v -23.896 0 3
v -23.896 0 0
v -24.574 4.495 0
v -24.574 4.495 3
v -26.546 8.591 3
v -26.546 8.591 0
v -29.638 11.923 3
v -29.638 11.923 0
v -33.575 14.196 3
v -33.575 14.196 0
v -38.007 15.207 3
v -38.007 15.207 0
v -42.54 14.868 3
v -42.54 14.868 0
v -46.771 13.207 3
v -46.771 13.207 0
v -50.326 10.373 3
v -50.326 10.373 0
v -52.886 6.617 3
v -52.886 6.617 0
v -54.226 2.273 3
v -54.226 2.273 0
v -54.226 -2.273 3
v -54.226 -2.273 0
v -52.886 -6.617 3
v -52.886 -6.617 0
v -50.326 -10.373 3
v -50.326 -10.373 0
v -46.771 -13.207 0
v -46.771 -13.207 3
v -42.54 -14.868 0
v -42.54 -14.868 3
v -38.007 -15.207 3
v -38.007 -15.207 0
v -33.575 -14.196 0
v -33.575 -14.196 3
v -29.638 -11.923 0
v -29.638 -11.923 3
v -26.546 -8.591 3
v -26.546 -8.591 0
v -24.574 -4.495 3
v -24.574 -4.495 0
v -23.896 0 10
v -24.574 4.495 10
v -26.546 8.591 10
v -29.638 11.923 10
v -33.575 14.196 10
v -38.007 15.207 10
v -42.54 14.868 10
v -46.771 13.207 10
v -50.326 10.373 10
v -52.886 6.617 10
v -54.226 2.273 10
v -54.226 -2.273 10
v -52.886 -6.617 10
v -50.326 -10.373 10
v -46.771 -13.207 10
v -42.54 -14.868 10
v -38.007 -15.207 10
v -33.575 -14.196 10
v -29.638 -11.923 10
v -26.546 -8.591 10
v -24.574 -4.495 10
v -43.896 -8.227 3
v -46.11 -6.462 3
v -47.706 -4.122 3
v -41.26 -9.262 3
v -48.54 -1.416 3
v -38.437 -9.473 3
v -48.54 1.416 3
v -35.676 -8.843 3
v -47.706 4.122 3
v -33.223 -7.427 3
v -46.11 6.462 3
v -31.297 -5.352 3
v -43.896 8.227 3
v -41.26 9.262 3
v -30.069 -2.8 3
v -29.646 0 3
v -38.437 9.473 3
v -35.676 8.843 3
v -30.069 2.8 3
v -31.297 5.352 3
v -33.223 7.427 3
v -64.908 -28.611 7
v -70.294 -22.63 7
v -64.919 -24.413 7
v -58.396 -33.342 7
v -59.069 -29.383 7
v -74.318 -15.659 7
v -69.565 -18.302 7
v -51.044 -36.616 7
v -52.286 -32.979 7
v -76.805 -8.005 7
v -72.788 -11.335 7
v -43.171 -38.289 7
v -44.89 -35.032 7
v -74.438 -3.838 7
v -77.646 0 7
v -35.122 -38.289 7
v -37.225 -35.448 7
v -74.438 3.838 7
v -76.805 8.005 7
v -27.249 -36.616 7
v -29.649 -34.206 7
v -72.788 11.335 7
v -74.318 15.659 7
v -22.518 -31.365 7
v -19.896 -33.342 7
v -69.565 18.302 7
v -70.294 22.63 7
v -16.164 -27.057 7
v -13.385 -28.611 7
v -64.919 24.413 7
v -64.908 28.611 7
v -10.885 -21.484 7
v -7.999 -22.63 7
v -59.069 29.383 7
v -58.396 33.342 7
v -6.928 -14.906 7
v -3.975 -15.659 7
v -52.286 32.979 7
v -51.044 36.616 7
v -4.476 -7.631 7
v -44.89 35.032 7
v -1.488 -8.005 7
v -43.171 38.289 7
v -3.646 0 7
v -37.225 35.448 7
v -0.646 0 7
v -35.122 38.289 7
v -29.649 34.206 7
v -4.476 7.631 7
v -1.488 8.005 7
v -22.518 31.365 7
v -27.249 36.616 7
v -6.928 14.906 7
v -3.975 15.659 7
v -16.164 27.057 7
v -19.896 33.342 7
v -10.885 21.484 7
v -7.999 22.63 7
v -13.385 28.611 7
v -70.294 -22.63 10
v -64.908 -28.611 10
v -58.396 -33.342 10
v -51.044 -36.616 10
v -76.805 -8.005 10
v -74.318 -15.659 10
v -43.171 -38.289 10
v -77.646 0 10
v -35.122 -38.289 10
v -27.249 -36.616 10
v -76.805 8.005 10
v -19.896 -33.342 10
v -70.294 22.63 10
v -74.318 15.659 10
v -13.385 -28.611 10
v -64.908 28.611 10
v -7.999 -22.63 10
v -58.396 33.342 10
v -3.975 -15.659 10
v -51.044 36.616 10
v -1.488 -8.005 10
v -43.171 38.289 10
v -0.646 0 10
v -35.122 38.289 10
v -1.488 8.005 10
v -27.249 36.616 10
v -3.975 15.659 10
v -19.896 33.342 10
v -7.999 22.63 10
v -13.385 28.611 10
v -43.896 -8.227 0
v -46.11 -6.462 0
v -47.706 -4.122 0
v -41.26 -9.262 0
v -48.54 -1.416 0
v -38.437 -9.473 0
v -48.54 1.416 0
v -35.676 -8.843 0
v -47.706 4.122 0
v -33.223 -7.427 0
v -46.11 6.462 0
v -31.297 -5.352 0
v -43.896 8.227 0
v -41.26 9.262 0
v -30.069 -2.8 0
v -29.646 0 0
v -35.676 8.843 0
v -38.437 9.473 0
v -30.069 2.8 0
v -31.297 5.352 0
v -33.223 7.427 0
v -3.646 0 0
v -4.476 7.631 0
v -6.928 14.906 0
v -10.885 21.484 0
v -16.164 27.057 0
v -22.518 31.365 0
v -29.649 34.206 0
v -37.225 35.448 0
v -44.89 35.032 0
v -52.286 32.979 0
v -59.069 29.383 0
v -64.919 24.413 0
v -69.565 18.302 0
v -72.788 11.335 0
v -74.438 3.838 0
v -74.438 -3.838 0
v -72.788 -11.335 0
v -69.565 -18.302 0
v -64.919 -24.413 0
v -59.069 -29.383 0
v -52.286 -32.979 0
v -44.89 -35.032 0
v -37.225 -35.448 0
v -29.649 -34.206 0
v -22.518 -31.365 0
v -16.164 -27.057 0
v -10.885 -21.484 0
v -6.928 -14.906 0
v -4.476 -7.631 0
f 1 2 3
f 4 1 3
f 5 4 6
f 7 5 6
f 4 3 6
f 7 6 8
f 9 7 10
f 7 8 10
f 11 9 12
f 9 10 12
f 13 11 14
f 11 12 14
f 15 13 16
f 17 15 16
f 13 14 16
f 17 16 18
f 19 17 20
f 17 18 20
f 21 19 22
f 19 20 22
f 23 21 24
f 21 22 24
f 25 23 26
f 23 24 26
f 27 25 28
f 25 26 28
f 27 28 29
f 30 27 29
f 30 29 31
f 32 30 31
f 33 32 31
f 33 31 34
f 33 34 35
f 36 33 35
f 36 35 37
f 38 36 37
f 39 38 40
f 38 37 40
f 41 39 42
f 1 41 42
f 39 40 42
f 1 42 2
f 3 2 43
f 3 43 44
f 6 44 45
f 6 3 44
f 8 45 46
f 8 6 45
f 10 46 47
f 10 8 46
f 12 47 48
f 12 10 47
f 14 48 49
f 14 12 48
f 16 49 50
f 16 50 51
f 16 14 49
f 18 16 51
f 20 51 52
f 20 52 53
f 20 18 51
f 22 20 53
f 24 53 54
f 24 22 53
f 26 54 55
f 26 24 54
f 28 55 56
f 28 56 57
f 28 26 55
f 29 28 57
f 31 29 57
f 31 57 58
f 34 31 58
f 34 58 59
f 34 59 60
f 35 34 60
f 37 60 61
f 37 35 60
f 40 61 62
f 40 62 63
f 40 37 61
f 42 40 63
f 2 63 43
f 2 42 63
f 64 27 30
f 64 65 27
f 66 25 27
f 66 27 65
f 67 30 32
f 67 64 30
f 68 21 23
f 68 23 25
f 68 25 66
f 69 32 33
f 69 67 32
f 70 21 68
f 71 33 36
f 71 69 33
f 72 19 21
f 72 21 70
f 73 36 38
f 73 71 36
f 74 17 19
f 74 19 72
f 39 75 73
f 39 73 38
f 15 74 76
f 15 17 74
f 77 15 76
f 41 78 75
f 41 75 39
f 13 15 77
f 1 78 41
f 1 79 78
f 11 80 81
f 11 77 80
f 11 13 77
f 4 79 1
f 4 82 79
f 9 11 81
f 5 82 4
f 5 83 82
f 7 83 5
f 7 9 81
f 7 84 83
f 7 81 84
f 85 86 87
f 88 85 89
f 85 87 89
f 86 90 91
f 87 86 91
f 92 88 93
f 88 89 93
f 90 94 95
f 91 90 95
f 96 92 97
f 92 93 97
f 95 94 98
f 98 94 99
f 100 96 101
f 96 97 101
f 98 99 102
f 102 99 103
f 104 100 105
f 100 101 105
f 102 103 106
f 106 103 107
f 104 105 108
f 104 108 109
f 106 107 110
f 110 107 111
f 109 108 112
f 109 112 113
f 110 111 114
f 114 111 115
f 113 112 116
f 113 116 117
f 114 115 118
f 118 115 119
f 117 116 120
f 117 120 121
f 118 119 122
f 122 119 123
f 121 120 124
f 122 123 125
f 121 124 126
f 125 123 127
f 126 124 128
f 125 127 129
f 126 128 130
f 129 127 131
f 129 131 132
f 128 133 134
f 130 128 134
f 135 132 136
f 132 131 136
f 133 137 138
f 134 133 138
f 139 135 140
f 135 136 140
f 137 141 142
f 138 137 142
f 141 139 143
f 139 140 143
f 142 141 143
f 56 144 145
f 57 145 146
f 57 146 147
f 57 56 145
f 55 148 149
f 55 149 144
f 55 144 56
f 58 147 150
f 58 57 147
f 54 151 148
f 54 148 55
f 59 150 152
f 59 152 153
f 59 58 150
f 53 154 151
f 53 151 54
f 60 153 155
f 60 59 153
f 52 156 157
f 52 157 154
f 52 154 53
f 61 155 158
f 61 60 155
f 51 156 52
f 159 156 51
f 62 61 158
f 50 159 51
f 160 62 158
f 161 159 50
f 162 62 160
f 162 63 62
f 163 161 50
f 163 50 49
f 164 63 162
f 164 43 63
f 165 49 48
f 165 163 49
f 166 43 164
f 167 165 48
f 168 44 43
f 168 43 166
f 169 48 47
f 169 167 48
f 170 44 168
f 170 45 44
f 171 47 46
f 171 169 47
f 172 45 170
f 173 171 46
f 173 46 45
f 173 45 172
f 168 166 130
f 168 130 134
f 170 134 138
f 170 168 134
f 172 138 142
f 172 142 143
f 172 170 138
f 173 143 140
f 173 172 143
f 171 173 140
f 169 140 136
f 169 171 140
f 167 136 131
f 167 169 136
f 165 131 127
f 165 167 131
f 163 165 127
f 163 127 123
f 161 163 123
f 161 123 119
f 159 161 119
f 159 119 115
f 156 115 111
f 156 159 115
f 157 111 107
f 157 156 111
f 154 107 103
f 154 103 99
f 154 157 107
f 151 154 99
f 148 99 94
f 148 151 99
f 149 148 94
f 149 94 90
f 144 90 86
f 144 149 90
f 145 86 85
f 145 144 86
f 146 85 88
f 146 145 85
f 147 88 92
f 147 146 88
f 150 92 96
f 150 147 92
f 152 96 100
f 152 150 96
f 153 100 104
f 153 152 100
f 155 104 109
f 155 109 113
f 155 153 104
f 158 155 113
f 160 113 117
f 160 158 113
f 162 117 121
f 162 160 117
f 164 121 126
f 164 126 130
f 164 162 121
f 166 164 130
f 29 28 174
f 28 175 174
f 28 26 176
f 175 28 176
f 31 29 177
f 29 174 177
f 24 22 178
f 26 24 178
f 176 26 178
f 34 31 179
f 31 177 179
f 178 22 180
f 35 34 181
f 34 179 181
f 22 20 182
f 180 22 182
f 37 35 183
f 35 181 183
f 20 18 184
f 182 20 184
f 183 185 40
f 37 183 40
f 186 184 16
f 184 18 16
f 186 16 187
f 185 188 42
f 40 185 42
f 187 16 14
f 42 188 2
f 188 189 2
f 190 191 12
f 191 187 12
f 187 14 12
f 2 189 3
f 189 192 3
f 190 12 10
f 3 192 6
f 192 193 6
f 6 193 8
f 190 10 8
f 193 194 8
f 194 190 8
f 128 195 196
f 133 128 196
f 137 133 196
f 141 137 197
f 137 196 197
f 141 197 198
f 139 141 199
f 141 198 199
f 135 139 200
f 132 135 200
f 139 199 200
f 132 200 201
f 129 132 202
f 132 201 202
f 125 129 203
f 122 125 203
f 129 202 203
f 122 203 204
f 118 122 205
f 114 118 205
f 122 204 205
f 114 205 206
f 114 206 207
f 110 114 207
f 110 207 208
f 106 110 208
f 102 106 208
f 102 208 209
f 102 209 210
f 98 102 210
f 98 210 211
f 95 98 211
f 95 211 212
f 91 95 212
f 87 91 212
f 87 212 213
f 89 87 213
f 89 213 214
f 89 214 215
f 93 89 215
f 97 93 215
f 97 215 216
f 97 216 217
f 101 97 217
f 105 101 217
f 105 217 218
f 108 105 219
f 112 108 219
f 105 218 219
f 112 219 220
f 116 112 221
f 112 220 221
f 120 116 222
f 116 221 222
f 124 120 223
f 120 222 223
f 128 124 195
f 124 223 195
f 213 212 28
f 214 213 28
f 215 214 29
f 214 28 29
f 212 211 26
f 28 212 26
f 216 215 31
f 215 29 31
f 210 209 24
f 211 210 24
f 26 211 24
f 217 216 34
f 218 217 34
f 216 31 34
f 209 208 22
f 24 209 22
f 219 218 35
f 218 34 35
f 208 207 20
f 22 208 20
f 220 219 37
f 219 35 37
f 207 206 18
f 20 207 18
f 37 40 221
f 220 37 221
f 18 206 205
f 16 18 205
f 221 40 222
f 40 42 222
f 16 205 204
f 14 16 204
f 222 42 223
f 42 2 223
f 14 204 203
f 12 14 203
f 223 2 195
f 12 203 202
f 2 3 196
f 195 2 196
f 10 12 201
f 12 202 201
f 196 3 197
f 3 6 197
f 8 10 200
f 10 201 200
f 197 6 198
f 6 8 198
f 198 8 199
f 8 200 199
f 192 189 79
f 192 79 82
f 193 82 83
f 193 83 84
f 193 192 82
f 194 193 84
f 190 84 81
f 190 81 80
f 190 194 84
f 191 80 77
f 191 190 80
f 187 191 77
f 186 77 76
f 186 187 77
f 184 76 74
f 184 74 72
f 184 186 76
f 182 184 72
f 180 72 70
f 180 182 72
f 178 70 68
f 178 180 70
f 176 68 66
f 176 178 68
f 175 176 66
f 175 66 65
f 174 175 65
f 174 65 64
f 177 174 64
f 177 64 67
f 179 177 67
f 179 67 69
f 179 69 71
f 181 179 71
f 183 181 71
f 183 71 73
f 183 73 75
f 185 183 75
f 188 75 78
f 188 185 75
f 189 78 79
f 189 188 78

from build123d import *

# Parameters (mm, degrees)
F0_R     = 15.25
F0_R_2   = 9.5
F1_DEPTH = 3
F0_R_3   = 35.5
F2_DEPTH = 10
F3_R     = 38.5
F3_R_2   = 35.5
F4_DEPTH = 3


# Not quite as in the source:
# - a feature names something its author has since deleted; it is built from what else it names


with BuildPart() as f1:
    # F0 (on Top) → F1 (new body)
    with BuildSketch(Plane.XY):
        with Locations((-39.1464792192, 0)):
            Circle(F0_R)
        with Locations((-39.1464792192, 0)):
            Circle(F0_R_2, mode=Mode.SUBTRACT)
    extrude(amount=F1_DEPTH)


with BuildPart() as f2:
    # F0 (on Top) → F2 (new body)
    with BuildSketch(Plane.XY):
        with Locations((-39.1464792192, 0)):
            Circle(F0_R_3)
        with Locations((-39.1464792192, 0)):
            Circle(F0_R, mode=Mode.SUBTRACT)
    extrude(amount=F2_DEPTH)

    # F3 (on face) → F4 (join)
    with BuildSketch(Plane.XY.offset(10)):
        with Locations((-39.1464792192, 0)):
            Circle(F3_R)
        with Locations((-39.1464792192, 0)):
            Circle(F3_R_2, mode=Mode.SUBTRACT)
    extrude(amount=-F4_DEPTH)


solid = Compound([f1.part, f2.part])
